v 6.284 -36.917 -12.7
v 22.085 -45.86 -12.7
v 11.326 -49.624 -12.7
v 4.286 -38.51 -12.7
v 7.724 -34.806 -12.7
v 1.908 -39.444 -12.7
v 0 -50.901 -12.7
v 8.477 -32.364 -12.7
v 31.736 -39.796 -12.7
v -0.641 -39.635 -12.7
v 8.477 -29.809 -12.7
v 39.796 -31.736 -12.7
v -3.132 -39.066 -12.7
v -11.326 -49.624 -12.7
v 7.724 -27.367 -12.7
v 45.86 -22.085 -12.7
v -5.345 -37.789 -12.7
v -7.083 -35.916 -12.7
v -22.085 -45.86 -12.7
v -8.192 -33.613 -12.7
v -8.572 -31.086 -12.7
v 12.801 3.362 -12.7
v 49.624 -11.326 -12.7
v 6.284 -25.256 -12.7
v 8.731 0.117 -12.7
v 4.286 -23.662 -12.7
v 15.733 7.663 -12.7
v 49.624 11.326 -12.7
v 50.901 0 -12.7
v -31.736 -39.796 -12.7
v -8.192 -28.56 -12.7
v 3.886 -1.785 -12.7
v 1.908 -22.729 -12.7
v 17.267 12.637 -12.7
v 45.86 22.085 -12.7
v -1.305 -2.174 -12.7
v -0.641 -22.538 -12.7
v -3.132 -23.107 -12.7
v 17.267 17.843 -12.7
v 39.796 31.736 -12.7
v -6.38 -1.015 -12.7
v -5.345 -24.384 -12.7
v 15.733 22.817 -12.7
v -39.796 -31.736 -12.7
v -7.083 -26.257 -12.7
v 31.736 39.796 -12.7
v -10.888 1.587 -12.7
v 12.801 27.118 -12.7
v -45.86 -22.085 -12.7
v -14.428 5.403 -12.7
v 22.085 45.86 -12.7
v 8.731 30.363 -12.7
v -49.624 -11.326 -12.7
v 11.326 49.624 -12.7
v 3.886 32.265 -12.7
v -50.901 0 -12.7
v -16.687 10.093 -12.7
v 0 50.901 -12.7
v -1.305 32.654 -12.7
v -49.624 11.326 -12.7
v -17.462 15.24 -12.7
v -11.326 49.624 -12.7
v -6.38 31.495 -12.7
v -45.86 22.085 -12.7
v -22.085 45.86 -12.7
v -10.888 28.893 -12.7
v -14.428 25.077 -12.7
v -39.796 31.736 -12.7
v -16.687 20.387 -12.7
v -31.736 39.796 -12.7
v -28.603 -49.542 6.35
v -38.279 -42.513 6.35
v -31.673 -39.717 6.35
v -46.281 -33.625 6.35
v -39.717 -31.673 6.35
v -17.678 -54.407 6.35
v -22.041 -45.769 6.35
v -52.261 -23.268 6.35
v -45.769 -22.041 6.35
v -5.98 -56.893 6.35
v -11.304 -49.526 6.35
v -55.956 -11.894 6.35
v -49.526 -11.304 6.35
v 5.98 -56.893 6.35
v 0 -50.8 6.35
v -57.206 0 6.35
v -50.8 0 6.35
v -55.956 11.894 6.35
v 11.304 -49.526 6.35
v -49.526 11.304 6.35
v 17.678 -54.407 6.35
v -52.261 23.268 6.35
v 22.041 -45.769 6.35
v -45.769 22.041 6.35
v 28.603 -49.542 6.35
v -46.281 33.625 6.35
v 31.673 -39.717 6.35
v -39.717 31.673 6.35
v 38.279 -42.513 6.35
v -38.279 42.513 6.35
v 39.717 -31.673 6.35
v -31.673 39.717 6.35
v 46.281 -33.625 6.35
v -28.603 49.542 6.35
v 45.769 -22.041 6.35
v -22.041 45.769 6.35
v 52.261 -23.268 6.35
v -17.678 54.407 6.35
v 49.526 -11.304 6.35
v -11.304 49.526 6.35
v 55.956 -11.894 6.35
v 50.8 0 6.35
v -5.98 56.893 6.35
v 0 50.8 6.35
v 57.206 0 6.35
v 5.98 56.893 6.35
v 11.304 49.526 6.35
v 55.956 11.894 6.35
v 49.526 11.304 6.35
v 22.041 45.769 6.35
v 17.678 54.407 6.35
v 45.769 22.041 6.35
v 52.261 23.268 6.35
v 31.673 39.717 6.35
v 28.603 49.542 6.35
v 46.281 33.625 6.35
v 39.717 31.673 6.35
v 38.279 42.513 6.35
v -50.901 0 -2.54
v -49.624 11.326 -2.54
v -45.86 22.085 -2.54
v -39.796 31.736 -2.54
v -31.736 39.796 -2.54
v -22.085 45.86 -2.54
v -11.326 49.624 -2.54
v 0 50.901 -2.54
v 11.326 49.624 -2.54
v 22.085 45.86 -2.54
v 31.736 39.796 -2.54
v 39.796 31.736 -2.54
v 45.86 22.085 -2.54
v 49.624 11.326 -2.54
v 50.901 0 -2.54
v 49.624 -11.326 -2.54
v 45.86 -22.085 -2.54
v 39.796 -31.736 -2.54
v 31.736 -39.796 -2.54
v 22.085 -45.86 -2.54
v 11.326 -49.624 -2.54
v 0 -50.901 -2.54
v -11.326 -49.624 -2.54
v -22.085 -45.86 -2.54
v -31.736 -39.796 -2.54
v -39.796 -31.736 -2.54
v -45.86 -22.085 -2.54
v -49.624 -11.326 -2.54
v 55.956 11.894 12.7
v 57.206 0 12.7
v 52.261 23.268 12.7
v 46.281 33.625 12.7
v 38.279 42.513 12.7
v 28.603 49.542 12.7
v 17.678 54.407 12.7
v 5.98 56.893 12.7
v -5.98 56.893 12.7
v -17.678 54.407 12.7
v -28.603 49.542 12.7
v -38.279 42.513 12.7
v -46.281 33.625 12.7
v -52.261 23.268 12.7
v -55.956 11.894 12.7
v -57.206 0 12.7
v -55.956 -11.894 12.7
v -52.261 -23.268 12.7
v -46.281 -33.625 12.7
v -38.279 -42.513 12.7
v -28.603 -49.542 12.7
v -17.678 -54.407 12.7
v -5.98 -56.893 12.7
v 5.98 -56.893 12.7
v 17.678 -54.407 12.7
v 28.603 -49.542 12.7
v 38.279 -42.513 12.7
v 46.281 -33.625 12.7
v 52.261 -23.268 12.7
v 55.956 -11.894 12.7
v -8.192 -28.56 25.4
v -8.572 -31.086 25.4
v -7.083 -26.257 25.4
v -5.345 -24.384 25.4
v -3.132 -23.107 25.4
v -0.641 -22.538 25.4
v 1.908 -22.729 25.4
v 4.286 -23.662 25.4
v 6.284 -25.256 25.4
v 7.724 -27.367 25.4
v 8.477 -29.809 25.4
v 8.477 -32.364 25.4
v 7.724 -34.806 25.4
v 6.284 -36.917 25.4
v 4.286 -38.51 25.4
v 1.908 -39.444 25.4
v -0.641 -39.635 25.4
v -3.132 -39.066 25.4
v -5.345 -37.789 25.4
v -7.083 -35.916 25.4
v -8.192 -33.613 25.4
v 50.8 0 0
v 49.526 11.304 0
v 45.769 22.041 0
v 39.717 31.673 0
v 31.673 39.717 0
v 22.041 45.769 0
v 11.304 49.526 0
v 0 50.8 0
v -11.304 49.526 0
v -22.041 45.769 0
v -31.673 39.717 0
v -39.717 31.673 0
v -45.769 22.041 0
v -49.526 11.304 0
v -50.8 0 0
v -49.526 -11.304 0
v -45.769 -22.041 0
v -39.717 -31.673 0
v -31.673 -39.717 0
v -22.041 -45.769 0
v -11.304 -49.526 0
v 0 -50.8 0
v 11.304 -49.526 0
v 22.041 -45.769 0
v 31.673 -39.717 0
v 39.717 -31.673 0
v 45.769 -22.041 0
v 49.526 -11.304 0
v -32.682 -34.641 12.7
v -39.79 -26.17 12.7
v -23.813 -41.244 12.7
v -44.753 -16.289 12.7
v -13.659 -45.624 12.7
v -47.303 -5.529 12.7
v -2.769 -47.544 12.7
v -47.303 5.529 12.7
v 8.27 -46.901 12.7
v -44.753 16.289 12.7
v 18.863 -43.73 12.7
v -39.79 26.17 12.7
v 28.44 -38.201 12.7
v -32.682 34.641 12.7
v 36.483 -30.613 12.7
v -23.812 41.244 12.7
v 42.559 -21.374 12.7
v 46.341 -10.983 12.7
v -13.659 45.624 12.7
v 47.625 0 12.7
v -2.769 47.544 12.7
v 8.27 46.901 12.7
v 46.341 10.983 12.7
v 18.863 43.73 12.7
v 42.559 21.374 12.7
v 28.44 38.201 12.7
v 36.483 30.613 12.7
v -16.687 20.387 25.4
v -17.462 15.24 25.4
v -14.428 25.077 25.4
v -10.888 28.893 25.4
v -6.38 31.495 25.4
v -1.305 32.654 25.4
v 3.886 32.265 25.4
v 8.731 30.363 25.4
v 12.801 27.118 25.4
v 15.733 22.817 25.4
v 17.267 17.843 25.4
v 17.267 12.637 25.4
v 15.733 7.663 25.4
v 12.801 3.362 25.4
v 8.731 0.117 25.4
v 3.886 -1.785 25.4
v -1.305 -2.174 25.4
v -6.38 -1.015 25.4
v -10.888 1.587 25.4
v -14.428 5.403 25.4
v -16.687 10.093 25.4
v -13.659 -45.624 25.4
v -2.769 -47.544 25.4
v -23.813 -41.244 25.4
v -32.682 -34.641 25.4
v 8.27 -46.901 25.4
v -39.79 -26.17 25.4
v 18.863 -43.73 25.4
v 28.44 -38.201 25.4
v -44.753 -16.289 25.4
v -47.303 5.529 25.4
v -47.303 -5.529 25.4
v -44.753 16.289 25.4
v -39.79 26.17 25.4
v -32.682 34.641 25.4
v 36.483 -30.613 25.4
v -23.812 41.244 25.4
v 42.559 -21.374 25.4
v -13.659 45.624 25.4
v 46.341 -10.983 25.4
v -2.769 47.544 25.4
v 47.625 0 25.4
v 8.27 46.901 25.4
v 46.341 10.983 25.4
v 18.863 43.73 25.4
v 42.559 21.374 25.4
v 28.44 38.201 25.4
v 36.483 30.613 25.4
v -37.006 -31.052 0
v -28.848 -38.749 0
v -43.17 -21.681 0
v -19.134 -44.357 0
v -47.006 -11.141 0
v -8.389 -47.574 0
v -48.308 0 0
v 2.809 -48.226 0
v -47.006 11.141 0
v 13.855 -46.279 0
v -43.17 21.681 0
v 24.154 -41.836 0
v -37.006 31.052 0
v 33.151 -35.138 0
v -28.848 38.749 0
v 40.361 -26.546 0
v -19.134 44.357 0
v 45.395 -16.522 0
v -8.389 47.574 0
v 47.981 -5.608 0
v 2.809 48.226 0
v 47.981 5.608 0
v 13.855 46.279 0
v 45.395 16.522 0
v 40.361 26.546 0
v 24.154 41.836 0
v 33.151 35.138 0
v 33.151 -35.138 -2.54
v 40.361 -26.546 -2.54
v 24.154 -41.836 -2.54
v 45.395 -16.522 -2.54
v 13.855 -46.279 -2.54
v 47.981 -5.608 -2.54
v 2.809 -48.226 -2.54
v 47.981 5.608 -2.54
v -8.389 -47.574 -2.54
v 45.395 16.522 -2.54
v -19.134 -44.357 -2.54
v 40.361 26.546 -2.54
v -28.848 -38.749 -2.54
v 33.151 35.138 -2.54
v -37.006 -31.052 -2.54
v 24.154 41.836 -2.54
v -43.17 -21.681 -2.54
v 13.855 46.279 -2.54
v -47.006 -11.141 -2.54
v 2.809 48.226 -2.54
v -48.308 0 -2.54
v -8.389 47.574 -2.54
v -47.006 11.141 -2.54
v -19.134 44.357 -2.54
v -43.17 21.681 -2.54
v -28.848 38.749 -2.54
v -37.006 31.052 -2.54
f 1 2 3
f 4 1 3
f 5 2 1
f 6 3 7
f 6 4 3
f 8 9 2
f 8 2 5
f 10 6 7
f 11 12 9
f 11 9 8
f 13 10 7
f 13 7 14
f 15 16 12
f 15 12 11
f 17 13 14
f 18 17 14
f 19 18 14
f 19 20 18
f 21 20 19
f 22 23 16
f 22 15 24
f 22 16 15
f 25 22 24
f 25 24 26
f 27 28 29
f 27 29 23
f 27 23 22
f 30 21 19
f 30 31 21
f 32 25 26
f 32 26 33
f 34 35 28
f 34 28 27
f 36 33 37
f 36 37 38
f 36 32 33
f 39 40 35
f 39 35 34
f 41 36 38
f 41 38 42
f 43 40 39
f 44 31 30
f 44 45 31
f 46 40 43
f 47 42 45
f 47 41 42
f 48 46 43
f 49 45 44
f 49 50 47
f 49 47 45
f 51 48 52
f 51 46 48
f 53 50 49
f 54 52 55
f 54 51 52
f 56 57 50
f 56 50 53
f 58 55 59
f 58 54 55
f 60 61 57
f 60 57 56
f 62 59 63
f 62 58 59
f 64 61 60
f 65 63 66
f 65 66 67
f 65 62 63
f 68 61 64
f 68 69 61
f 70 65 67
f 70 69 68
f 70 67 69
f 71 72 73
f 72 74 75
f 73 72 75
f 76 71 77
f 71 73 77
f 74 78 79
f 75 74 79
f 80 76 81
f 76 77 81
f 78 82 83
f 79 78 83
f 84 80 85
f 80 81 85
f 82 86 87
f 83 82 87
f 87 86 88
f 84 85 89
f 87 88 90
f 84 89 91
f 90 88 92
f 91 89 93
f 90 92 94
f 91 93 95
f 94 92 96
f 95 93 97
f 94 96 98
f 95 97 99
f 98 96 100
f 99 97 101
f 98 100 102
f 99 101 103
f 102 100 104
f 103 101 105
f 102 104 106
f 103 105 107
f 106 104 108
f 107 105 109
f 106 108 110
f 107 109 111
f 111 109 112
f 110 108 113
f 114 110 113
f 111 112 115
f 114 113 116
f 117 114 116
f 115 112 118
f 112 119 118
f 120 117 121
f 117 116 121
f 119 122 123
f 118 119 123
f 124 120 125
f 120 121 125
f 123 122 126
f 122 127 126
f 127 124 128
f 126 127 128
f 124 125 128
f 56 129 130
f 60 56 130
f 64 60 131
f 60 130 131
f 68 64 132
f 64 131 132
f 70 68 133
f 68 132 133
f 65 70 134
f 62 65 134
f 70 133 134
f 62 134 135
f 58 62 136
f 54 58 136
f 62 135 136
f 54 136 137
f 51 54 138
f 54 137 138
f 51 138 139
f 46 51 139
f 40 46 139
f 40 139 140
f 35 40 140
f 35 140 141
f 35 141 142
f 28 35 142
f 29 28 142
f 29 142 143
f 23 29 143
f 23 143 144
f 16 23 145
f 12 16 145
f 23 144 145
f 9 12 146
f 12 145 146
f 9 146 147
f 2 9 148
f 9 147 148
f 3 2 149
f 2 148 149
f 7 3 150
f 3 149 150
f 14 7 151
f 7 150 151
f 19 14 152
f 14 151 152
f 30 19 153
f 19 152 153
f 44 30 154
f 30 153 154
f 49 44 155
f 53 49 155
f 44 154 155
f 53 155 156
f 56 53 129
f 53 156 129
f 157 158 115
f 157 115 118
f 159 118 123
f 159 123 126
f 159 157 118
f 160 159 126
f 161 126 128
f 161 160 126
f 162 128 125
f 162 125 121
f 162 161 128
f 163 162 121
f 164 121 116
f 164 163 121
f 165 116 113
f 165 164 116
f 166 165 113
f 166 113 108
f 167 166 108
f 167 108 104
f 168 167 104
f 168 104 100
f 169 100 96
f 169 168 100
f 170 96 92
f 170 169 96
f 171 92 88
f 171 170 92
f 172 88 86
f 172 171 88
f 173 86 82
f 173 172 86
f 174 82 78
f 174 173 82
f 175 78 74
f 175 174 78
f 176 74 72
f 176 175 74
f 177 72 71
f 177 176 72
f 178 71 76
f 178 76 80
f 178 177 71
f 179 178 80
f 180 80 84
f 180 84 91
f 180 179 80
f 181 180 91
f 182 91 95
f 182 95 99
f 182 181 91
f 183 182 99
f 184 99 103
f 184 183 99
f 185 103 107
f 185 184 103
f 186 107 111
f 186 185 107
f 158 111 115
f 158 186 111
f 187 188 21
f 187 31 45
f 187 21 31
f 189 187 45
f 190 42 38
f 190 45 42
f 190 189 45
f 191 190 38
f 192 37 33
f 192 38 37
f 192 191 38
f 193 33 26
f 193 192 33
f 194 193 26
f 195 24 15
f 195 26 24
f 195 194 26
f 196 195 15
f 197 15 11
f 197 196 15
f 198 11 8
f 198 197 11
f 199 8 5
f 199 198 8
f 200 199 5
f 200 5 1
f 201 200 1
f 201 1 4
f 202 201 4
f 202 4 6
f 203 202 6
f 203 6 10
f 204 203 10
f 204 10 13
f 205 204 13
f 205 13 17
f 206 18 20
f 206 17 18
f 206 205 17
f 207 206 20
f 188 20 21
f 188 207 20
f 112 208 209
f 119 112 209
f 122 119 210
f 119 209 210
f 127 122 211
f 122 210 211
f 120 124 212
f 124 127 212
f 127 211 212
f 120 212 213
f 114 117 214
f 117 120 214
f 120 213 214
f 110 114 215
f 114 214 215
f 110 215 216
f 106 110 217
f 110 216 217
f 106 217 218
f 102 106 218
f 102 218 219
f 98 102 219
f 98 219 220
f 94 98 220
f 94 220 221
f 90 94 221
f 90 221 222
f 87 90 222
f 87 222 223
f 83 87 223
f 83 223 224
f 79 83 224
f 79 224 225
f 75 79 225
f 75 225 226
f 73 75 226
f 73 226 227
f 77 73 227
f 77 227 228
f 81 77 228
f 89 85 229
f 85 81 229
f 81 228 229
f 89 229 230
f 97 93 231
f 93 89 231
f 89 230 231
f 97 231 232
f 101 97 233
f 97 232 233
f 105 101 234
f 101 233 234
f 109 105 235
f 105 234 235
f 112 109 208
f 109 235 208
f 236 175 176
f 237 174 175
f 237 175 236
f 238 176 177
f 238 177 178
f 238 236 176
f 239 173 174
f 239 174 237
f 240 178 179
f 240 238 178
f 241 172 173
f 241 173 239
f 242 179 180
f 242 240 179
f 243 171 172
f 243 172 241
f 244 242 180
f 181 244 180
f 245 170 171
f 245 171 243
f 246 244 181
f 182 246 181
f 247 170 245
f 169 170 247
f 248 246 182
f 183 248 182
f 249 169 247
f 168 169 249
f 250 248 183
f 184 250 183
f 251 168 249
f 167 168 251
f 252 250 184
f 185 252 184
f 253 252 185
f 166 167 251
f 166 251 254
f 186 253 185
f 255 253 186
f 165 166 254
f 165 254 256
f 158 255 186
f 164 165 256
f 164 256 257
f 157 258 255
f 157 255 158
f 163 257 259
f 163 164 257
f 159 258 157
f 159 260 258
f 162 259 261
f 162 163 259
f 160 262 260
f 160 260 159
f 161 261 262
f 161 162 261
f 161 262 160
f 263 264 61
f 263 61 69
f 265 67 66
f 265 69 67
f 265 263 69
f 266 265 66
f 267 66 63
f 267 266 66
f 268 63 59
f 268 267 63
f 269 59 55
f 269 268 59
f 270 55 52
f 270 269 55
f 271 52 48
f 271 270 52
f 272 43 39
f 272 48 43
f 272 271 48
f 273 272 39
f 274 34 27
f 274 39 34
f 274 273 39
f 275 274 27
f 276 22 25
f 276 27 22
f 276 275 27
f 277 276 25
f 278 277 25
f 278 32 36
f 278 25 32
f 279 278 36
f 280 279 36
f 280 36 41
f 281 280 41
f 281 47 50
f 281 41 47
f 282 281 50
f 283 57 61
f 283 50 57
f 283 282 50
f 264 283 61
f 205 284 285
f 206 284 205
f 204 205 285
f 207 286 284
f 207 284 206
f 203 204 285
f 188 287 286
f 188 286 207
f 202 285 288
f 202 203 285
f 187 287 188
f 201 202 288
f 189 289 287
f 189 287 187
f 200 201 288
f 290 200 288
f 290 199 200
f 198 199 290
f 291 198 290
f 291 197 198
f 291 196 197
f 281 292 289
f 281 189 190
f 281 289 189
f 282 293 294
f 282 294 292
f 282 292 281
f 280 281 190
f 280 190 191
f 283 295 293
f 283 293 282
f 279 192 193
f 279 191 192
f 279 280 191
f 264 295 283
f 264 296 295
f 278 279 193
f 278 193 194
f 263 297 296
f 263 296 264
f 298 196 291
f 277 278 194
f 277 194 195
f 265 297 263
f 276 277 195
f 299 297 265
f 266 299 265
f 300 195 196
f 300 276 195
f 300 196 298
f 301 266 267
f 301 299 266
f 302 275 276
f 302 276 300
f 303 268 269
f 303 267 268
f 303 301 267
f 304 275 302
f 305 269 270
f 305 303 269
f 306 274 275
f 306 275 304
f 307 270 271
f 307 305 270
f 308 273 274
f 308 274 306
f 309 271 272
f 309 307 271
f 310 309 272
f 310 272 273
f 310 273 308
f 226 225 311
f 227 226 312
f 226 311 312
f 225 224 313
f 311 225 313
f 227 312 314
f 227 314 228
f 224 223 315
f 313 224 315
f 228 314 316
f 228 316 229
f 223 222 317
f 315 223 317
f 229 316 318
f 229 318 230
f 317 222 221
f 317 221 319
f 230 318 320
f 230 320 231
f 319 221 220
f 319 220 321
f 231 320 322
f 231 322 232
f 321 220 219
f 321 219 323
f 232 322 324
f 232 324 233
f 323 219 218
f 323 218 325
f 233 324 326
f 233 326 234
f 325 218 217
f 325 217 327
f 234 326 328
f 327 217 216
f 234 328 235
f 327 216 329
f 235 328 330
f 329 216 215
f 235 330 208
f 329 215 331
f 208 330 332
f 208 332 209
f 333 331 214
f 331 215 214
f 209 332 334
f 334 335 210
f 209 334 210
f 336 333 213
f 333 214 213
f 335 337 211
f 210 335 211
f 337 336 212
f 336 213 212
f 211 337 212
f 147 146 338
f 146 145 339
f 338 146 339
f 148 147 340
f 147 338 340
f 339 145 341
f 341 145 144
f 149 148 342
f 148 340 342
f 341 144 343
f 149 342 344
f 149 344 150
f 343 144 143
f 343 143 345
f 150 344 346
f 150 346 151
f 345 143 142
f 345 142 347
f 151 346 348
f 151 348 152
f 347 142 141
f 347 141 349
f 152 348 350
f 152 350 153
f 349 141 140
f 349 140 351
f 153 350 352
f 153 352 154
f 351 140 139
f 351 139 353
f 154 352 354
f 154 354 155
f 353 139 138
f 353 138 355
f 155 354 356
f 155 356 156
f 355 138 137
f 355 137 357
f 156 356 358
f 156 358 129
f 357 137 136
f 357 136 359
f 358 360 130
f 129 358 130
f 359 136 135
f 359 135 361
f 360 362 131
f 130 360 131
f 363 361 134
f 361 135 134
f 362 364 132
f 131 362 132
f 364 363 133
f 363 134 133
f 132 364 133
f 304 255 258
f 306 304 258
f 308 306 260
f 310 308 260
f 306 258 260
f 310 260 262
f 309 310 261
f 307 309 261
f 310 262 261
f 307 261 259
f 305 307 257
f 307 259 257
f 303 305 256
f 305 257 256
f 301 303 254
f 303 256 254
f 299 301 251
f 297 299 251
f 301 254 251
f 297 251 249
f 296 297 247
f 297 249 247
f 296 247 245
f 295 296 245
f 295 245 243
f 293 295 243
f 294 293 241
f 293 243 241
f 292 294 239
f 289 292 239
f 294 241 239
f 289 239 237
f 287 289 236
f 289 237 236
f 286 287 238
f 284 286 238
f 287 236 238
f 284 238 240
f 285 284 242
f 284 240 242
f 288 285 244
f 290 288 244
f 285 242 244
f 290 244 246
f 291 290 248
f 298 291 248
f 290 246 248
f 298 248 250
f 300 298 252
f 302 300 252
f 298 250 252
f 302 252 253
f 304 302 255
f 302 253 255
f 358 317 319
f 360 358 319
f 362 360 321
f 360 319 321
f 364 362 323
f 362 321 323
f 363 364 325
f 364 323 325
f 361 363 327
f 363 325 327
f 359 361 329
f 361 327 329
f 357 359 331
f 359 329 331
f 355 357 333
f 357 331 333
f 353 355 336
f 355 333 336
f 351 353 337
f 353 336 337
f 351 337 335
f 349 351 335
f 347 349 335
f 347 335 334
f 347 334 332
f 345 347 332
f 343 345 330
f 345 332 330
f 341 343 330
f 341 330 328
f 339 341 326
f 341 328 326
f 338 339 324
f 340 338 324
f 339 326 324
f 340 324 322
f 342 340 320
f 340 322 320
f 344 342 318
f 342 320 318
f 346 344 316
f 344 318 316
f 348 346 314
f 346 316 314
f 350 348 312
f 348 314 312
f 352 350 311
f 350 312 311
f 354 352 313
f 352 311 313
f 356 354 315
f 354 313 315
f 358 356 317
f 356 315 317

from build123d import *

# Parameters (mm, degrees)
SKETCH1_R               = 50.8
BOSS_EXTRUDE1_DEPTH     = 25.4
CUT_EXTRUDE_THIN2_START = -12.7
SKETCH23_R              = 50.8
SKETCH23_R_2            = 47.625
CUT_EXTRUDE_THIN2_DEPTH = 12.7
SKETCH26_R              = 57.206394865
BOSS_EXTRUDE3_DEPTH     = 6.35
SKETCH31_R              = 48.307957565
BOSS_EXTRUDE4_DEPTH     = 2.54
SKETCH32_R              = 50.900583186
BOSS_EXTRUDE5_DEPTH     = 10.16
CUT_EXTRUDE5_DEPTH      = 85.795655708
CUT_EXTRUDE5_DEPTH_BACK = 85.795655708
SKETCH20_R              = 17.4625
CUT_EXTRUDE6_DEPTH      = 85.795655708
CUT_EXTRUDE6_DEPTH_BACK = 85.795655708
SKETCH21_R              = 8.5725


with BuildPart() as part:
    # Sketch1 → Boss-Extrude1 (new body)
    with BuildSketch(Plane.XY):
        Circle(SKETCH1_R)
    extrude(amount=BOSS_EXTRUDE1_DEPTH)

    # Sketch23 → Cut-Extrude-Thin2 (cut)
    with BuildSketch(Plane.XY.offset(25.4).offset(CUT_EXTRUDE_THIN2_START)):
        Circle(SKETCH23_R)
        Circle(SKETCH23_R_2, mode=Mode.SUBTRACT)
    extrude(amount=CUT_EXTRUDE_THIN2_DEPTH, mode=Mode.SUBTRACT)

    # Sketch26 → Boss-Extrude3 (add)
    with BuildSketch(Plane.XY.offset(12.7)):
        Circle(SKETCH26_R)
    extrude(amount=-BOSS_EXTRUDE3_DEPTH)

    # Sketch31 → Boss-Extrude4 (add)
    with BuildSketch(Plane(origin=(0, 0, 0), x_dir=(-1, 0, 0), z_dir=(0, 0, -1))):
        Circle(SKETCH31_R)
    extrude(amount=BOSS_EXTRUDE4_DEPTH)

    # Sketch32 → Boss-Extrude5 (add)
    with BuildSketch(Plane(origin=(0, 0, -2.54), x_dir=(-1, 0, 0), z_dir=(0, 0, -1))):
        Circle(SKETCH32_R)
    extrude(amount=BOSS_EXTRUDE5_DEPTH)

    # Sketch20 → Cut-Extrude5 (cut, two sides: drawn at the far end of the back side and taken through both)
    with BuildSketch(Plane(origin=(0, 0, 0), x_dir=(-1, 0, 0), z_dir=(0, 0, -1)).offset(-CUT_EXTRUDE5_DEPTH_BACK)):
        with Locations((0, 15.24)):
            Circle(SKETCH20_R)
    extrude(amount=CUT_EXTRUDE5_DEPTH + CUT_EXTRUDE5_DEPTH_BACK, mode=Mode.SUBTRACT)

    # Sketch21 → Cut-Extrude6 (cut, two sides: drawn at the far end of the back side and taken through both)
    with BuildSketch(Plane(origin=(0, 0, 0), x_dir=(-1, 0, 0), z_dir=(0, 0, -1)).offset(-CUT_EXTRUDE6_DEPTH_BACK)):
        with Locations((0, -31.086483225)):
            Circle(SKETCH21_R)
    extrude(amount=CUT_EXTRUDE6_DEPTH + CUT_EXTRUDE6_DEPTH_BACK, mode=Mode.SUBTRACT)


solid = part.part
